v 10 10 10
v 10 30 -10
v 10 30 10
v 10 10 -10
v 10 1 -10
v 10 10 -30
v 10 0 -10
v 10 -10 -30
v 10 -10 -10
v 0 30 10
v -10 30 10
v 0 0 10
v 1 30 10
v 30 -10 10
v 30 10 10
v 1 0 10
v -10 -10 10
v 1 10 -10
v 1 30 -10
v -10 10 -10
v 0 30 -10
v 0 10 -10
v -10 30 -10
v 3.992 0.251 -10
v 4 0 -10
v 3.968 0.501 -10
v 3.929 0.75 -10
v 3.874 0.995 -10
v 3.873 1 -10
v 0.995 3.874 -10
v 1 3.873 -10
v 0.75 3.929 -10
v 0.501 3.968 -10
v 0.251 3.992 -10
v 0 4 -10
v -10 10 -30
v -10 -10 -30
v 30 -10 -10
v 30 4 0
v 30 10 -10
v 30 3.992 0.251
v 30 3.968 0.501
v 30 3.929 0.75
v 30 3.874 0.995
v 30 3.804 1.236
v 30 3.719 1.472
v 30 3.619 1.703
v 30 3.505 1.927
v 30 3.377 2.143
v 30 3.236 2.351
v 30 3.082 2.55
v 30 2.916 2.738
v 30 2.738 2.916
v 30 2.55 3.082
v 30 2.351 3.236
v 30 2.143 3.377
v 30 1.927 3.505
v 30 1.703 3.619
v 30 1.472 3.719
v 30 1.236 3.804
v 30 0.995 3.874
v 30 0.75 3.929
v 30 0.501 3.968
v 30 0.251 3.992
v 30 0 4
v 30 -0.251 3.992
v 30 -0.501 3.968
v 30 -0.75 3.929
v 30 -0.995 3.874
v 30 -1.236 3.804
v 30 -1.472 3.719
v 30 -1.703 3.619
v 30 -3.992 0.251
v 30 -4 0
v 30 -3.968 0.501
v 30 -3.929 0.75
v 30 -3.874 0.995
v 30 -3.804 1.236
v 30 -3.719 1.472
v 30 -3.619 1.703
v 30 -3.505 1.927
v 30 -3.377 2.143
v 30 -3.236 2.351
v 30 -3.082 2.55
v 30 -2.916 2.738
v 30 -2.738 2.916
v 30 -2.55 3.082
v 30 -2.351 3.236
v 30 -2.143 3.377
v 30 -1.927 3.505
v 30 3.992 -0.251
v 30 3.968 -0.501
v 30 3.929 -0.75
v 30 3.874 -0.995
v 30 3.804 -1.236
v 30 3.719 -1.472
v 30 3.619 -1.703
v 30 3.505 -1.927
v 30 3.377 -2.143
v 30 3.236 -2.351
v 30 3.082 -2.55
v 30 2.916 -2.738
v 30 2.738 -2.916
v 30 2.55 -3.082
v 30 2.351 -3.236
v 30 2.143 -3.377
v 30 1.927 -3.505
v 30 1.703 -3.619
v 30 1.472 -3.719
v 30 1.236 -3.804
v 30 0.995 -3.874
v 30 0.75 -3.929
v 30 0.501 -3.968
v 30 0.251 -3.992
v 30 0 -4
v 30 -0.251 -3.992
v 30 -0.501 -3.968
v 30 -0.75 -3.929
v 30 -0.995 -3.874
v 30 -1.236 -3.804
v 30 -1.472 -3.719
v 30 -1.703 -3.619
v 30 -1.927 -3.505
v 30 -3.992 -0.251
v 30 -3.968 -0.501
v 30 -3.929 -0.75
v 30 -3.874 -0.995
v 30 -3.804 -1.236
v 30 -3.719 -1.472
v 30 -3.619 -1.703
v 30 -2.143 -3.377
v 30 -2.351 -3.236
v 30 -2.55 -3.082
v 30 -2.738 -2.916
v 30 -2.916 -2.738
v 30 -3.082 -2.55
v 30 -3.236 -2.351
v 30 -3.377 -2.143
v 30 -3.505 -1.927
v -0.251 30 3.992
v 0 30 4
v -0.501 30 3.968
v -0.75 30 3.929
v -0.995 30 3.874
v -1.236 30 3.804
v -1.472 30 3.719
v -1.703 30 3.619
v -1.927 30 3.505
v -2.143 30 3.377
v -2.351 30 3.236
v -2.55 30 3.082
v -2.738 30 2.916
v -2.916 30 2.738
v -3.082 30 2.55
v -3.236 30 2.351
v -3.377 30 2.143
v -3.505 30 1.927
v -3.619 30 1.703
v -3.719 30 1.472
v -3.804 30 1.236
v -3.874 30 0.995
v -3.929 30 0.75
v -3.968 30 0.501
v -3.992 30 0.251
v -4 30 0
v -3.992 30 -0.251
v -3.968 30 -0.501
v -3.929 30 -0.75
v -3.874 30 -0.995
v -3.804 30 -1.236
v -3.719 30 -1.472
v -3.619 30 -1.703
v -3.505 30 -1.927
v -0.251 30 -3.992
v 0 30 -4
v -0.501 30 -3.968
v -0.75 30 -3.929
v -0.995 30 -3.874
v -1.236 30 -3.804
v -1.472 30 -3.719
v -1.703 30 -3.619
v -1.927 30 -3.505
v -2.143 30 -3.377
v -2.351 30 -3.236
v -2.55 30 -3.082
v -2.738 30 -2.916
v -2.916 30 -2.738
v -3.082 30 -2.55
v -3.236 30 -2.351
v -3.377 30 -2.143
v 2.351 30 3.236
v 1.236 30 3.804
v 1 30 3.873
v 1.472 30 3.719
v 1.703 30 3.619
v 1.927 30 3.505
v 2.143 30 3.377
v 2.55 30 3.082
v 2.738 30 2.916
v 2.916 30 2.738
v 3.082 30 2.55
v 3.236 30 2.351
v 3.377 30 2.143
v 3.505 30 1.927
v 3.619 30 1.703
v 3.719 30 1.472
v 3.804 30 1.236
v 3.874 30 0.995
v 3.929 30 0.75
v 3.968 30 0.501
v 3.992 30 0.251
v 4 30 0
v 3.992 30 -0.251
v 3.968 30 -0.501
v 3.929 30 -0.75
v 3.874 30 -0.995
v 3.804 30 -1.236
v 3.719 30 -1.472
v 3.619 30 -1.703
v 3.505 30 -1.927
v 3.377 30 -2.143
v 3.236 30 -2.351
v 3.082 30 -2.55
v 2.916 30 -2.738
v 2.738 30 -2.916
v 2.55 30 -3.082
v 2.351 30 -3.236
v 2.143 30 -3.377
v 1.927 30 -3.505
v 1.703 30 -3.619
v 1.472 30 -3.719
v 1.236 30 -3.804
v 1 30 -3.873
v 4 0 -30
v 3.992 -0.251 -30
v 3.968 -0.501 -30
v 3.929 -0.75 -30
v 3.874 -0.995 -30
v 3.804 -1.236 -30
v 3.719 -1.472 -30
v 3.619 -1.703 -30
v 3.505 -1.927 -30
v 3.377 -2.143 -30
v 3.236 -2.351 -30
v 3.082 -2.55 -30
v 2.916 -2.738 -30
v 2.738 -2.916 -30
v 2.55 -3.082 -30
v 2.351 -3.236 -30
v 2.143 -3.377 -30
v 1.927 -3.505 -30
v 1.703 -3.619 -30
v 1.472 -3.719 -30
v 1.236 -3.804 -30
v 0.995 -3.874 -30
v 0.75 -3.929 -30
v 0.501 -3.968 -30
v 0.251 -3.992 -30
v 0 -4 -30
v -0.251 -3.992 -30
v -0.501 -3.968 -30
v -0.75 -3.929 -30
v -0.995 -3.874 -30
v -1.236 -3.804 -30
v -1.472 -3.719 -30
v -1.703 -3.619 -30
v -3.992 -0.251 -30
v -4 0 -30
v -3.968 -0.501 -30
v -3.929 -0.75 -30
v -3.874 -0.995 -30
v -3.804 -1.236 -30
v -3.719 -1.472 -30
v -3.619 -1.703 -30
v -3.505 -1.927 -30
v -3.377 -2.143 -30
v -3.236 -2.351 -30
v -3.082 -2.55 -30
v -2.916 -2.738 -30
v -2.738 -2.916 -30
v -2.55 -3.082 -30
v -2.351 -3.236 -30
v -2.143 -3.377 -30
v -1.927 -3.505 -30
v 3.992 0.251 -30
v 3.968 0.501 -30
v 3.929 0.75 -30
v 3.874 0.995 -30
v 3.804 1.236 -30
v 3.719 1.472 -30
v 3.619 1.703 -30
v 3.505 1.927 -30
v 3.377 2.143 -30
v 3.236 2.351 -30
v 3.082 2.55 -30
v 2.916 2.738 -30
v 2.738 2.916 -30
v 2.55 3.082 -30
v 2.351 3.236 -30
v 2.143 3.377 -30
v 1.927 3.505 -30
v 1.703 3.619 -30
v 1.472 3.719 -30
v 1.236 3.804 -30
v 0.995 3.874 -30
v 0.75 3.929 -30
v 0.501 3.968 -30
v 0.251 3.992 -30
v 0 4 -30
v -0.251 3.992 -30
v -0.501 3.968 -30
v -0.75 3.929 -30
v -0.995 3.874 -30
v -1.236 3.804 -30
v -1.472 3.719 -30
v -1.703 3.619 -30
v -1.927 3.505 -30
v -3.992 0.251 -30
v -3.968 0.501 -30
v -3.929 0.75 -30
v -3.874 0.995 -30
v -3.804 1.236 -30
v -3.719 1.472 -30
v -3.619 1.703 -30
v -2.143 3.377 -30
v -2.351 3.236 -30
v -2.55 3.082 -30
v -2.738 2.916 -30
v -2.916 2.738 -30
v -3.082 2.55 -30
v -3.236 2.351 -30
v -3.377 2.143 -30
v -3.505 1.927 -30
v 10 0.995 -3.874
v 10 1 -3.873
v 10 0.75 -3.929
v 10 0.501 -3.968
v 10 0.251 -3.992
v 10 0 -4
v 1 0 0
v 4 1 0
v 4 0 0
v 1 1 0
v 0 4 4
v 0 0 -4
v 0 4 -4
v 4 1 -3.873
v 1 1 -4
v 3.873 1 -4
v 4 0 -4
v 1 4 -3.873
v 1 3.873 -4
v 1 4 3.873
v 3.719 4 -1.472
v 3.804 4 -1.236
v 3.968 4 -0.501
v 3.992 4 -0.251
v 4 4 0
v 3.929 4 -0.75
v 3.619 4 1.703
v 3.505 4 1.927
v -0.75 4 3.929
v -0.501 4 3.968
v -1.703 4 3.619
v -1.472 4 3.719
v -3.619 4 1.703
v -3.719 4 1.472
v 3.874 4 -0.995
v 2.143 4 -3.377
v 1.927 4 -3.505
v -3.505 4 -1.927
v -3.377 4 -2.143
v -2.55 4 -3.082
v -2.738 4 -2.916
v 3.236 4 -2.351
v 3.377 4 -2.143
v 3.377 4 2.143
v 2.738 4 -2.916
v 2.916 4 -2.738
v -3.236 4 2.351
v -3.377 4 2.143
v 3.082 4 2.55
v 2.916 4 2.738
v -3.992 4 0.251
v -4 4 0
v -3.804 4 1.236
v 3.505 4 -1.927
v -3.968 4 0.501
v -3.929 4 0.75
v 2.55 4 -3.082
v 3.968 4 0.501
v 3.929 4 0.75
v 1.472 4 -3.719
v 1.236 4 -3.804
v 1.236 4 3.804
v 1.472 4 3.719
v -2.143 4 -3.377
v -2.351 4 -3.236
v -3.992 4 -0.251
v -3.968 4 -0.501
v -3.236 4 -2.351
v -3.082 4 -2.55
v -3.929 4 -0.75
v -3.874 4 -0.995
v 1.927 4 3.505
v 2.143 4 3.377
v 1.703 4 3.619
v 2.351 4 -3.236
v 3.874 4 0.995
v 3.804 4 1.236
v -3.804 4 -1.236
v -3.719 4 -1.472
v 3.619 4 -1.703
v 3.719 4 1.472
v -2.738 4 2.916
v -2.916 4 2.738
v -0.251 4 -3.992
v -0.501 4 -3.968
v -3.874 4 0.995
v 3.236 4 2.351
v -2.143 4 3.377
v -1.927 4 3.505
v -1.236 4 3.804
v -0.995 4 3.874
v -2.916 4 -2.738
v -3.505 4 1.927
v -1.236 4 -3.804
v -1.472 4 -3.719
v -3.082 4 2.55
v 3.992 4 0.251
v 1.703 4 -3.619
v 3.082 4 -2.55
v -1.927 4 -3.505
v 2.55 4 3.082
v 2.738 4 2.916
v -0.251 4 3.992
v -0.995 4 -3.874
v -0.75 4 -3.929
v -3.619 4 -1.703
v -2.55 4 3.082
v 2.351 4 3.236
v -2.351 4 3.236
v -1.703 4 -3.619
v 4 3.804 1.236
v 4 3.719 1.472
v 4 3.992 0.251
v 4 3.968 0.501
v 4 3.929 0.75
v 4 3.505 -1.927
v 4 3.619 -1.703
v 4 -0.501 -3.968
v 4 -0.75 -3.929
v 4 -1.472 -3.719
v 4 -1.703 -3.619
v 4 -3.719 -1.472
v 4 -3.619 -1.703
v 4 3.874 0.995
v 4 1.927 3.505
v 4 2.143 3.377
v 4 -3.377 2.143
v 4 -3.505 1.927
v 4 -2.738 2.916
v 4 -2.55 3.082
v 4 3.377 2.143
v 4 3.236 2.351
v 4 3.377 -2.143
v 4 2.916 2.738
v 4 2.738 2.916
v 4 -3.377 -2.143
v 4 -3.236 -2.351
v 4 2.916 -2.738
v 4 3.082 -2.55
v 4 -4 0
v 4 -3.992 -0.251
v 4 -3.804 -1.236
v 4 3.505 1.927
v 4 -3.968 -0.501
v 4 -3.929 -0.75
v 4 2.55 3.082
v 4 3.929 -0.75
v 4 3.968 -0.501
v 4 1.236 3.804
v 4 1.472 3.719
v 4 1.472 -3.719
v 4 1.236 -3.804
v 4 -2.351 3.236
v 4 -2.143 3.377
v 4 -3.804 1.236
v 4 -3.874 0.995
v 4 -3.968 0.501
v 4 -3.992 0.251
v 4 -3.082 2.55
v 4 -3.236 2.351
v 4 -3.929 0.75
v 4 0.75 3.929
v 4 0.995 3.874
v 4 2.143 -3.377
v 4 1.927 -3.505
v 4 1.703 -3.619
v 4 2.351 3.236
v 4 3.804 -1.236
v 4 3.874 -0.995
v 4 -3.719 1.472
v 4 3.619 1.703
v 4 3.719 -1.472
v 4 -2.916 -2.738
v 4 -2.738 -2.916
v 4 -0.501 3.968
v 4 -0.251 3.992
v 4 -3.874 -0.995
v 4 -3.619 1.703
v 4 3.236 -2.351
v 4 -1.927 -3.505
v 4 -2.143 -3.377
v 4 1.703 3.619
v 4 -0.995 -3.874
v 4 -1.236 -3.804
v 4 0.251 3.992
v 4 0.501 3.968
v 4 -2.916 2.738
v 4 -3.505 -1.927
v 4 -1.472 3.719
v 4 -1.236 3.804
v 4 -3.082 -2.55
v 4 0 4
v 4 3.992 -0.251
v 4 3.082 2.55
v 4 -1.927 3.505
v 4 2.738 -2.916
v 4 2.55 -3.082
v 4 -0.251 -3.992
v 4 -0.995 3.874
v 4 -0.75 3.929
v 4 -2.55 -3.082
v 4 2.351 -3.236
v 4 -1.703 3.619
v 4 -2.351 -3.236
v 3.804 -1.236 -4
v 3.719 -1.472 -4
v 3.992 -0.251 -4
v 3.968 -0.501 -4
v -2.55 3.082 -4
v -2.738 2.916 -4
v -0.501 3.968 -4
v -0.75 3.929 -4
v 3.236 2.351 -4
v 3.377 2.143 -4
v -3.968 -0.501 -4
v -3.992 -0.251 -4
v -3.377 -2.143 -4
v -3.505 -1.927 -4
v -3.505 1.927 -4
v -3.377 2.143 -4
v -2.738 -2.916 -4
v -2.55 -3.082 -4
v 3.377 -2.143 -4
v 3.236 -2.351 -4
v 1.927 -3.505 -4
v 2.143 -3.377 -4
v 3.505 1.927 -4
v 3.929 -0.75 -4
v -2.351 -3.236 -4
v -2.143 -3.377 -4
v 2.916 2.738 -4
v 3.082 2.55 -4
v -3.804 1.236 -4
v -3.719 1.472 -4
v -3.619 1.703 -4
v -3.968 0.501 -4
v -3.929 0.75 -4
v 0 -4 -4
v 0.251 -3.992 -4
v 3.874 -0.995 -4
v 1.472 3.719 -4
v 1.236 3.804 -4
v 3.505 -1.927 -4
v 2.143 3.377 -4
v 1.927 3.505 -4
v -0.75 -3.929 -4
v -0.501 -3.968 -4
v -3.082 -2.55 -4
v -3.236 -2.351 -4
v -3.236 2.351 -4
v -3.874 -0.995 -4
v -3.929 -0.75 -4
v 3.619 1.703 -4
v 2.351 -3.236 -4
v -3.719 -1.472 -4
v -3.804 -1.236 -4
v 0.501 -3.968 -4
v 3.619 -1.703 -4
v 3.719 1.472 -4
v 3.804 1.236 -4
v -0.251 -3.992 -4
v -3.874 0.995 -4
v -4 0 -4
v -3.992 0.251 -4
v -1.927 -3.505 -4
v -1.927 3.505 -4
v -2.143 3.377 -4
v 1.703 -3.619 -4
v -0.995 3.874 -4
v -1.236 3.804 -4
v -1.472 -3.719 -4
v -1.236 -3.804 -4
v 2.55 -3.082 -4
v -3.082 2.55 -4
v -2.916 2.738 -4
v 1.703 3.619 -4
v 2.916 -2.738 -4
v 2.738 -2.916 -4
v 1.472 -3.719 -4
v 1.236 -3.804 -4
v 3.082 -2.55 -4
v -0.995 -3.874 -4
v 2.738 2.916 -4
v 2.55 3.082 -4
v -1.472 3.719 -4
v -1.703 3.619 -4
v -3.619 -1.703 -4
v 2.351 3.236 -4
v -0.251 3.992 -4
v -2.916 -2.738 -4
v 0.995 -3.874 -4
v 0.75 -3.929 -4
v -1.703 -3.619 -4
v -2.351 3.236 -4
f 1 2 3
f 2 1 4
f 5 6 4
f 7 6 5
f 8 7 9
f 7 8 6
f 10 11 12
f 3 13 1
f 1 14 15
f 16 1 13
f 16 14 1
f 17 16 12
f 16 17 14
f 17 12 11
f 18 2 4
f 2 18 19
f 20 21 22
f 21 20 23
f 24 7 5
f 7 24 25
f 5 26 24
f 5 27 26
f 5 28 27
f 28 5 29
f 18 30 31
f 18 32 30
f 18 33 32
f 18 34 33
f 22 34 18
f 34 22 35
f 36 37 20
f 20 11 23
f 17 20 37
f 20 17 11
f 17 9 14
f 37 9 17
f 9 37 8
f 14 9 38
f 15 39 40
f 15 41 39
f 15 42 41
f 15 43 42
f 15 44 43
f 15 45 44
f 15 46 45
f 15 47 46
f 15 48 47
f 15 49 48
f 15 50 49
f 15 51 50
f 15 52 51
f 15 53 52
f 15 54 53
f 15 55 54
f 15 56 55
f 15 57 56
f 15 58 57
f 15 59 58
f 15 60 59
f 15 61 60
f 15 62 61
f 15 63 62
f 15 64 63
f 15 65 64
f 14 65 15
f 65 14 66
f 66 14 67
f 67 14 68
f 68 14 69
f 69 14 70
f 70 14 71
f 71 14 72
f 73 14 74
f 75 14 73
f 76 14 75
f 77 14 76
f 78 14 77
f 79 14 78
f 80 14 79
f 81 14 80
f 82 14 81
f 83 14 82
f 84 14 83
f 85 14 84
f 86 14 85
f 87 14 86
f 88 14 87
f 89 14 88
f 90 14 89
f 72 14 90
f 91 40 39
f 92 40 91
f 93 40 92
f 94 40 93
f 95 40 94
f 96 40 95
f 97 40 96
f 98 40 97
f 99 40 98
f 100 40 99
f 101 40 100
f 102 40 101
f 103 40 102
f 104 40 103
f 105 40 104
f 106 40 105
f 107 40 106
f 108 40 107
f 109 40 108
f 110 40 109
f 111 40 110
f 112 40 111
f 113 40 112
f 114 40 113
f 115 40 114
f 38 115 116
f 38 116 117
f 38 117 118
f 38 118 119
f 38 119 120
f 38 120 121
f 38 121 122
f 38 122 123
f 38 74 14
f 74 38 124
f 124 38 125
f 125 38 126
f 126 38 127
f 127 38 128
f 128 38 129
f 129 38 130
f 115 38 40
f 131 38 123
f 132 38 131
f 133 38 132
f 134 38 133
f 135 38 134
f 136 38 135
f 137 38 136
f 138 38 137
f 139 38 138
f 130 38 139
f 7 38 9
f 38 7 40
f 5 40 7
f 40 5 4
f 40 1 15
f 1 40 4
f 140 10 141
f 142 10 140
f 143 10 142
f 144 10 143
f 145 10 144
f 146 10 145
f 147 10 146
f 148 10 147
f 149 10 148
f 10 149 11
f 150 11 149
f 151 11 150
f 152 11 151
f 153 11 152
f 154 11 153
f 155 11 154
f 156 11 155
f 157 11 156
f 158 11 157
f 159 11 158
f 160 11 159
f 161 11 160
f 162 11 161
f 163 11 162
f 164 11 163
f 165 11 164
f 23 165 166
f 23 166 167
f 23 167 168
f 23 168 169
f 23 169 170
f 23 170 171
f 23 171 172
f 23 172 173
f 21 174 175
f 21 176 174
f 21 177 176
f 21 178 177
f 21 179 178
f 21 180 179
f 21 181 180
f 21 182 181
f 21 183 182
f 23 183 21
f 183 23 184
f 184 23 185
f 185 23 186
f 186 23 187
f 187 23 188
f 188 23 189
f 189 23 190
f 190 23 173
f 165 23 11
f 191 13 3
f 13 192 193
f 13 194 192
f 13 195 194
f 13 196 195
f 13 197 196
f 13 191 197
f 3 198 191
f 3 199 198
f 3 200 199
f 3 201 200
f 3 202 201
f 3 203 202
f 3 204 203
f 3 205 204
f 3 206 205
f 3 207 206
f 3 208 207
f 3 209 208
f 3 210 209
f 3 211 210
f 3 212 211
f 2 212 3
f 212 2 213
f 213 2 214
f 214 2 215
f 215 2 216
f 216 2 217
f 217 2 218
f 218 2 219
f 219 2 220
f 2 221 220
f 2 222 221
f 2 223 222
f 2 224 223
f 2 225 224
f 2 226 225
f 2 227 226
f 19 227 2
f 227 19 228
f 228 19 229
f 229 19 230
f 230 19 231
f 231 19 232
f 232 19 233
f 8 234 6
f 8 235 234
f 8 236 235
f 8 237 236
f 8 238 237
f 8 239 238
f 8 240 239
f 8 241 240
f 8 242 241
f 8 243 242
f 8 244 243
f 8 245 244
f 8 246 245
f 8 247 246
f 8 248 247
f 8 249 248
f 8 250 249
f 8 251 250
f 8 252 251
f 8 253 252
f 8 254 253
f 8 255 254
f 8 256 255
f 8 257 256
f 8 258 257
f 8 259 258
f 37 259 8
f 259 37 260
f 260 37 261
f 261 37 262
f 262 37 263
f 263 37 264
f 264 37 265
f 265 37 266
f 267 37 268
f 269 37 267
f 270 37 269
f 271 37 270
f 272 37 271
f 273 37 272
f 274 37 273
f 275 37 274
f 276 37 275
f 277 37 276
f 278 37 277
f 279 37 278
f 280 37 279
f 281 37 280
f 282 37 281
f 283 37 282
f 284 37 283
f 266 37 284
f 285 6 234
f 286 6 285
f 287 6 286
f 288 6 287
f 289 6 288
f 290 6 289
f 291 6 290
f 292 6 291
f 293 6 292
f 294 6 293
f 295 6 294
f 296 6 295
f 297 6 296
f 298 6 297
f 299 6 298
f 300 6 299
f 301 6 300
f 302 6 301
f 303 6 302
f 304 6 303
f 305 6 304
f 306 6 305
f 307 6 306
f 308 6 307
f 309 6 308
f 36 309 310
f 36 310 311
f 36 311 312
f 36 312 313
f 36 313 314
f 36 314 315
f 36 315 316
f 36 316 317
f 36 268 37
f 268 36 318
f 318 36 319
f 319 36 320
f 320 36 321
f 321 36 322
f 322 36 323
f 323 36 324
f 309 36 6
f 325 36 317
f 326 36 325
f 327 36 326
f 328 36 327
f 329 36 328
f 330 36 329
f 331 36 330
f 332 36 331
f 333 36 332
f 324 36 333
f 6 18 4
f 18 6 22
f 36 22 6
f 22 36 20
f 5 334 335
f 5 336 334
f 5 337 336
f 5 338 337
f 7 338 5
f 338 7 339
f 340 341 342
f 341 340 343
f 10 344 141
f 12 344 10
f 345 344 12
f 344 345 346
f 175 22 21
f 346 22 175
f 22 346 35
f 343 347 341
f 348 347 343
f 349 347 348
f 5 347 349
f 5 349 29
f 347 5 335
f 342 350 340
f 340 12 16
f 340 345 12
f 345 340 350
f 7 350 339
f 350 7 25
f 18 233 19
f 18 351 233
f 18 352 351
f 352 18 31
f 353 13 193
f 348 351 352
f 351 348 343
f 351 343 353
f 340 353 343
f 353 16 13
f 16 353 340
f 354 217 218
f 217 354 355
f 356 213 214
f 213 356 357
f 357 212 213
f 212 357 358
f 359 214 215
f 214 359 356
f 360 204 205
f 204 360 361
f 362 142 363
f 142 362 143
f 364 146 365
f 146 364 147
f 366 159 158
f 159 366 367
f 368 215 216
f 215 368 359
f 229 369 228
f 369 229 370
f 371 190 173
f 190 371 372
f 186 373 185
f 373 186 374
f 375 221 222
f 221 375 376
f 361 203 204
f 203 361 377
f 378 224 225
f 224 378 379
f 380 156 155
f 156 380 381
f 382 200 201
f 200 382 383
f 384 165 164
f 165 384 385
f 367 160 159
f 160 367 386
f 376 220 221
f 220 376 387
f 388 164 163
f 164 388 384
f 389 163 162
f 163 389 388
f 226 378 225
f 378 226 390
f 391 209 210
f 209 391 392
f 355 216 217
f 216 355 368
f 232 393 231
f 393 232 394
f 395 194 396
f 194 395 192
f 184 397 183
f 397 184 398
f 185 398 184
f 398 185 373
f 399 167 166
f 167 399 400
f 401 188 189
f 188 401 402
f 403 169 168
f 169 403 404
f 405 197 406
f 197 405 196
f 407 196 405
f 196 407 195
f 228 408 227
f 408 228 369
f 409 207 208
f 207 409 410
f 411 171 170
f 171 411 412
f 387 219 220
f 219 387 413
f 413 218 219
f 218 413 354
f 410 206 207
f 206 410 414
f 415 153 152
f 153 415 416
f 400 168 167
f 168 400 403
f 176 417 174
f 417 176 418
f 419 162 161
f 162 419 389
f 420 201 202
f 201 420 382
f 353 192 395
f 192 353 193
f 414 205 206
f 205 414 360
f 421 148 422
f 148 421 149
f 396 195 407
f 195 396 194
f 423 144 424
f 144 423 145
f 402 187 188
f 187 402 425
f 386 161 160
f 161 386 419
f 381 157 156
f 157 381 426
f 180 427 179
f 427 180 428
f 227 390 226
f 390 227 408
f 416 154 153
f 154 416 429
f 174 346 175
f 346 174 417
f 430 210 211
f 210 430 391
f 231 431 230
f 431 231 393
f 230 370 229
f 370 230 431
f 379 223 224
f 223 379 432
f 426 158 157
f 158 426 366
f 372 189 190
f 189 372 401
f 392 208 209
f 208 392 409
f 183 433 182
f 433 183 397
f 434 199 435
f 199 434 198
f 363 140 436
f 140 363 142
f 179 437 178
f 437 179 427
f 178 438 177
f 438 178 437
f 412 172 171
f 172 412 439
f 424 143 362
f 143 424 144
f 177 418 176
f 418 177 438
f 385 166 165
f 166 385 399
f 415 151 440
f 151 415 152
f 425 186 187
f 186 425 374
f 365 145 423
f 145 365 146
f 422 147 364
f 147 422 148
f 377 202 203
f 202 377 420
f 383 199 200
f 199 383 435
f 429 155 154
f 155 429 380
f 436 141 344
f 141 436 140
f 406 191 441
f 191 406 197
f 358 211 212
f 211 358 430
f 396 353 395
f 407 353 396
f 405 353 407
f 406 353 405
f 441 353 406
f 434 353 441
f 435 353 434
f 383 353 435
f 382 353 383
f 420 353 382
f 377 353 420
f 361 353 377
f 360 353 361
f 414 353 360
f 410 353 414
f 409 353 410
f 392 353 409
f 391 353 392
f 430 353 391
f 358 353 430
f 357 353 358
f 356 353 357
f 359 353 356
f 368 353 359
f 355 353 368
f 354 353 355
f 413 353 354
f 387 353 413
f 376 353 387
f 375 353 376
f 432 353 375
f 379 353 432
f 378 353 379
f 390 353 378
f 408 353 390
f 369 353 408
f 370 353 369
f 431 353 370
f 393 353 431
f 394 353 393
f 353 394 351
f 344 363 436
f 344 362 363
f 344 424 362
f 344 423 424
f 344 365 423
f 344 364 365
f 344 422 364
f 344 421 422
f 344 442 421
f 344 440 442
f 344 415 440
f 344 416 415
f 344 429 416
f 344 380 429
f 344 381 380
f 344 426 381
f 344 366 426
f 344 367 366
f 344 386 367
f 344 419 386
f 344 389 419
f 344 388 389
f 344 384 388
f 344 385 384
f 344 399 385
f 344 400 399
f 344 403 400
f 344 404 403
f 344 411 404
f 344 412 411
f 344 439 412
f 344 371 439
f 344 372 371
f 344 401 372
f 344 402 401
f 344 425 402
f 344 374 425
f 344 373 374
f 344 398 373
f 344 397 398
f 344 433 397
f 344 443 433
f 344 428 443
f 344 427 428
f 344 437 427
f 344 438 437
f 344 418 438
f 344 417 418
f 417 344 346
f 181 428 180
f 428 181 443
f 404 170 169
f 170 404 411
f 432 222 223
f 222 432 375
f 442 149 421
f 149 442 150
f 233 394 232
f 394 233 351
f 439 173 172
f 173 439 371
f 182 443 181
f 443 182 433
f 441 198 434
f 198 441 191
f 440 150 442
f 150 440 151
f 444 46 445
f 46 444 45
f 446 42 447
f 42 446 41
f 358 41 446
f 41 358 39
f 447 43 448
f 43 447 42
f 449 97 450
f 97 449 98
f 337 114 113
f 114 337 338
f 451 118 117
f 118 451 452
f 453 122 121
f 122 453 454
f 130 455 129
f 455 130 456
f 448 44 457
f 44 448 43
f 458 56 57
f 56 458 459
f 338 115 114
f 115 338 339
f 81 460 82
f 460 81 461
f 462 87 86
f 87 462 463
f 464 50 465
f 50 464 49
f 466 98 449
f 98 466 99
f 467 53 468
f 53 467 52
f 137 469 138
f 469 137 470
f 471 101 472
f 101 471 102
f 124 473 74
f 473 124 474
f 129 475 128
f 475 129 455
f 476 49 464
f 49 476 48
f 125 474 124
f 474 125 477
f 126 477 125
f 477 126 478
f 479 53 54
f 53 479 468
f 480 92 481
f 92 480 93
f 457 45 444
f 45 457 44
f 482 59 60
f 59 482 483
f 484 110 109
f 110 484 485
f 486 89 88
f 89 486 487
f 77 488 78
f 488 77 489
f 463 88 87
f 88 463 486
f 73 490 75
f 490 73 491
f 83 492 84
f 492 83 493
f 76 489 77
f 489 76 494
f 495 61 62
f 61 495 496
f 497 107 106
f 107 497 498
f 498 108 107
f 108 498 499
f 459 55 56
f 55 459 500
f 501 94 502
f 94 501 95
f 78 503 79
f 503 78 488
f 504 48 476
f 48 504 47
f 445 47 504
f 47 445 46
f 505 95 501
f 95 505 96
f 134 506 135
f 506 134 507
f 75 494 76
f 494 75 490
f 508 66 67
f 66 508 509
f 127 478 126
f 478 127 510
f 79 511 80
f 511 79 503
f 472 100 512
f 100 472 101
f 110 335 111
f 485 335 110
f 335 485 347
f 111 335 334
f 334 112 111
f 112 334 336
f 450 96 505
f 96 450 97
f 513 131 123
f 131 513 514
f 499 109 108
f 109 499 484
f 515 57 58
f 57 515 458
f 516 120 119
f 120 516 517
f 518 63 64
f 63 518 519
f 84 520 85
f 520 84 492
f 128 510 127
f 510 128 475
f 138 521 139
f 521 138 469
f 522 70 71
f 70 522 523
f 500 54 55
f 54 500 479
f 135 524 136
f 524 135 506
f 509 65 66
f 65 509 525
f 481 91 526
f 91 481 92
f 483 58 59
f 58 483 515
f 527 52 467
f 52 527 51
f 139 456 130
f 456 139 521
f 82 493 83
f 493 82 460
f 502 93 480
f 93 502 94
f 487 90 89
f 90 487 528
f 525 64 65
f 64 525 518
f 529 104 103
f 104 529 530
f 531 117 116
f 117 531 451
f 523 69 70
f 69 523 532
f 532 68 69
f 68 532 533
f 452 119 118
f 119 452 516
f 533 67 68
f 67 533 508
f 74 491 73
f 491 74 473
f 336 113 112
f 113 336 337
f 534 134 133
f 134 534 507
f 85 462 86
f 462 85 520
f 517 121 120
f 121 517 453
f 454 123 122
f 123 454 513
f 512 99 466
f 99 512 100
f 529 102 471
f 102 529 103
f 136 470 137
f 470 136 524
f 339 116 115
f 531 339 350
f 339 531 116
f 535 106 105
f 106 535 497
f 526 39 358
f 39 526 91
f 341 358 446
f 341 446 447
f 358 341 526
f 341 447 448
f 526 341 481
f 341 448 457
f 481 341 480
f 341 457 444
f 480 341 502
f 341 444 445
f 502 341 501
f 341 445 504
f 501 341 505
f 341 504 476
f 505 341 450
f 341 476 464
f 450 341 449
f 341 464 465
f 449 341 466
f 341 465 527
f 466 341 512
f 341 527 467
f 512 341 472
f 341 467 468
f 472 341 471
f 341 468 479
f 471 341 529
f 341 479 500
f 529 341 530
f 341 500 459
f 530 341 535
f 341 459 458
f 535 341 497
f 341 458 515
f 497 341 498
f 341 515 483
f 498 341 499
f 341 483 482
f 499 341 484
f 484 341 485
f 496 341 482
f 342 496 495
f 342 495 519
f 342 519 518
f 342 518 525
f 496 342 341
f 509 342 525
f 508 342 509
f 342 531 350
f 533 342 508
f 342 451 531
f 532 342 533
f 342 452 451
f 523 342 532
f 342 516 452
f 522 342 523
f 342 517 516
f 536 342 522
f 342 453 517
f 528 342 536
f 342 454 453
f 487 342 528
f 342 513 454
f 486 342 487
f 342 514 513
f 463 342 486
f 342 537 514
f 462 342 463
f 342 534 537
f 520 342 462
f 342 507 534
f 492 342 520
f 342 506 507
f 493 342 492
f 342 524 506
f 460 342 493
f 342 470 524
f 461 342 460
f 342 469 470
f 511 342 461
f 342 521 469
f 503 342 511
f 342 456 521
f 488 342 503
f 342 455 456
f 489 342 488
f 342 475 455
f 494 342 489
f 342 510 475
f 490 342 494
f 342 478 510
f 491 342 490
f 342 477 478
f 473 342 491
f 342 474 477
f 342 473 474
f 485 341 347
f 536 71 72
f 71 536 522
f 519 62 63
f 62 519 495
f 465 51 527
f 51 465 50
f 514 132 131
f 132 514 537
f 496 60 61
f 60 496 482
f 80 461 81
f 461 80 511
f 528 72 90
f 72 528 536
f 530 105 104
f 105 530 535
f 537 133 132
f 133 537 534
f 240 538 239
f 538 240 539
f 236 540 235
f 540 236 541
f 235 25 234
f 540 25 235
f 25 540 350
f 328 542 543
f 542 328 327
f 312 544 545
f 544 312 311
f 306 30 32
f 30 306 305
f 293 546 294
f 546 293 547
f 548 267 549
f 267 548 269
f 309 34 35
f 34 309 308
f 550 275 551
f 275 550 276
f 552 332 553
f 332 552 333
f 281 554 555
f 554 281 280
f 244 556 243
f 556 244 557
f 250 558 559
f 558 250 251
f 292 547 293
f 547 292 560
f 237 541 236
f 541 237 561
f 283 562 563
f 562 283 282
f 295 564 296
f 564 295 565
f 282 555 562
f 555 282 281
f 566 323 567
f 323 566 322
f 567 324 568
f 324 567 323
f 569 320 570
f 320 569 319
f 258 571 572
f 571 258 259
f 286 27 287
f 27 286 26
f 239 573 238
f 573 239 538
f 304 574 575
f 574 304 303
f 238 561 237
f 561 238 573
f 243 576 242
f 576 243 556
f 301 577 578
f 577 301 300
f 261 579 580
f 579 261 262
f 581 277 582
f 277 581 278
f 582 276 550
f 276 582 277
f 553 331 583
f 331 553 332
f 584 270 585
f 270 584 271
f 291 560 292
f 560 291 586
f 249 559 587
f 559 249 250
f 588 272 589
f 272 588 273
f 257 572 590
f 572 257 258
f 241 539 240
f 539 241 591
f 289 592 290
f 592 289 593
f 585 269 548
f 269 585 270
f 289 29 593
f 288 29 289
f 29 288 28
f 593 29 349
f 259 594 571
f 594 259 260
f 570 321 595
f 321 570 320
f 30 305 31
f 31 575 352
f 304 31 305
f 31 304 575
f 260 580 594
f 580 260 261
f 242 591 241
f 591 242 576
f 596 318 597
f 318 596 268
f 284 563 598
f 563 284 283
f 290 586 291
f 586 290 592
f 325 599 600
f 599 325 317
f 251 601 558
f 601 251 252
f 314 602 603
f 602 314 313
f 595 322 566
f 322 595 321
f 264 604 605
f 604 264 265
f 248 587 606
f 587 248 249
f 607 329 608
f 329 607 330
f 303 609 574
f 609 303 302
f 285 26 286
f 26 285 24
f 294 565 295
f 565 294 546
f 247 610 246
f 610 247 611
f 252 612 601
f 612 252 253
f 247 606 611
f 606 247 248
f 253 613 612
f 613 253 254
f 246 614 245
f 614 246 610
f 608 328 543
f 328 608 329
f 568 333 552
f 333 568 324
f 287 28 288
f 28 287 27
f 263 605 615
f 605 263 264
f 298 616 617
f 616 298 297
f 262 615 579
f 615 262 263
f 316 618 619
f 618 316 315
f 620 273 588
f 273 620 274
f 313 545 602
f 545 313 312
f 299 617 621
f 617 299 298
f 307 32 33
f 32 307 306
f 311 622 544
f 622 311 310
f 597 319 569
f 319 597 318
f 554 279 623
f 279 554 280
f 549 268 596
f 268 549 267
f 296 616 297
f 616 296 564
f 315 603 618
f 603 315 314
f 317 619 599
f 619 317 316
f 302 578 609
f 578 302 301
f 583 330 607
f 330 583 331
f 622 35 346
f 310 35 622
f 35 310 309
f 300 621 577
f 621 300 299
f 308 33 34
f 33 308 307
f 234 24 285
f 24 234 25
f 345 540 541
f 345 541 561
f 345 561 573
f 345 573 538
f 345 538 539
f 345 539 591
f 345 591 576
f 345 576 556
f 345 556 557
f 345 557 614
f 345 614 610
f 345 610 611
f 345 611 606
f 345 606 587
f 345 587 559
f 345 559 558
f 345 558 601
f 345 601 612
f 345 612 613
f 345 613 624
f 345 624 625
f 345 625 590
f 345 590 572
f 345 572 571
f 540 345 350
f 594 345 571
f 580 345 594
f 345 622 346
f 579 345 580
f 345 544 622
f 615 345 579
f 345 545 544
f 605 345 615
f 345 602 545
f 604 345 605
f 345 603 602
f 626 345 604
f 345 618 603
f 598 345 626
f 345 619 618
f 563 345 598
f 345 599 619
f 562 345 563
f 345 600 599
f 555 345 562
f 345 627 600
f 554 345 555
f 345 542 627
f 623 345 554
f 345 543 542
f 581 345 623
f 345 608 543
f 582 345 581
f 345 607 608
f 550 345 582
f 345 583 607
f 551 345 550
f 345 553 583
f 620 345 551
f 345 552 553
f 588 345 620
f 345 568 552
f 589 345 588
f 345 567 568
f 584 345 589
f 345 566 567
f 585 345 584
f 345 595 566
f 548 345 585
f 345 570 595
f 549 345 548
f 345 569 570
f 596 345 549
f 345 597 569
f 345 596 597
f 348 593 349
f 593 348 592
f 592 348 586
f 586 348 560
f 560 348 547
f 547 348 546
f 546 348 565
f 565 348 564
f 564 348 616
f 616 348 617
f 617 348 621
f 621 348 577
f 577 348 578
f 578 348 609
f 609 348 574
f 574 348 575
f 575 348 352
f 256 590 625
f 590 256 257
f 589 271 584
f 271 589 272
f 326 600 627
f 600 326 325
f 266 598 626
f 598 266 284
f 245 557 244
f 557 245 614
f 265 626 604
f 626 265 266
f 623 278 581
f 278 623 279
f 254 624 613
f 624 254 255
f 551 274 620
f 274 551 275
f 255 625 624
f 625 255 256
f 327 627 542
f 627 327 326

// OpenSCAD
$fn=100;
fudge = 0.0;
rod_radius=4;
difference(){
    translate([-10,-10,-10]){
        union(){
            cube([20,20,20]);
            translate([20,0,0]){
                cube([20,20,20]);
            }
            translate([0,20,0]){
                cube([20,20,20]);
            }
            translate([0,0,-20]){
                cube([20,20,20]);
            }
        }
    }
    translate([0,rod_radius,0]){
        rotate([-90,0,0]){
            cylinder(h=30, r1=rod_radius + fudge, r2=rod_radius + fudge);
        }
    }
    translate([rod_radius,0,0]){
        rotate([90,0,90]){
            cylinder(h=30, r1=rod_radius + fudge, r2=rod_radius + fudge);
        }
    }
    translate([0,0,-rod_radius]){
        rotate([180,0,0]){
            cylinder(h=30, r1=rod_radius + fudge, r2=rod_radius + fudge);
        }
    }
    translate([-10,-10,-10]){
        //expansion cuts
        translate([10,10,0]){
            cube([10,1,10]);
        }
        translate([10,10,0]){
            cube([1,50,50]);
        }
    }
}
